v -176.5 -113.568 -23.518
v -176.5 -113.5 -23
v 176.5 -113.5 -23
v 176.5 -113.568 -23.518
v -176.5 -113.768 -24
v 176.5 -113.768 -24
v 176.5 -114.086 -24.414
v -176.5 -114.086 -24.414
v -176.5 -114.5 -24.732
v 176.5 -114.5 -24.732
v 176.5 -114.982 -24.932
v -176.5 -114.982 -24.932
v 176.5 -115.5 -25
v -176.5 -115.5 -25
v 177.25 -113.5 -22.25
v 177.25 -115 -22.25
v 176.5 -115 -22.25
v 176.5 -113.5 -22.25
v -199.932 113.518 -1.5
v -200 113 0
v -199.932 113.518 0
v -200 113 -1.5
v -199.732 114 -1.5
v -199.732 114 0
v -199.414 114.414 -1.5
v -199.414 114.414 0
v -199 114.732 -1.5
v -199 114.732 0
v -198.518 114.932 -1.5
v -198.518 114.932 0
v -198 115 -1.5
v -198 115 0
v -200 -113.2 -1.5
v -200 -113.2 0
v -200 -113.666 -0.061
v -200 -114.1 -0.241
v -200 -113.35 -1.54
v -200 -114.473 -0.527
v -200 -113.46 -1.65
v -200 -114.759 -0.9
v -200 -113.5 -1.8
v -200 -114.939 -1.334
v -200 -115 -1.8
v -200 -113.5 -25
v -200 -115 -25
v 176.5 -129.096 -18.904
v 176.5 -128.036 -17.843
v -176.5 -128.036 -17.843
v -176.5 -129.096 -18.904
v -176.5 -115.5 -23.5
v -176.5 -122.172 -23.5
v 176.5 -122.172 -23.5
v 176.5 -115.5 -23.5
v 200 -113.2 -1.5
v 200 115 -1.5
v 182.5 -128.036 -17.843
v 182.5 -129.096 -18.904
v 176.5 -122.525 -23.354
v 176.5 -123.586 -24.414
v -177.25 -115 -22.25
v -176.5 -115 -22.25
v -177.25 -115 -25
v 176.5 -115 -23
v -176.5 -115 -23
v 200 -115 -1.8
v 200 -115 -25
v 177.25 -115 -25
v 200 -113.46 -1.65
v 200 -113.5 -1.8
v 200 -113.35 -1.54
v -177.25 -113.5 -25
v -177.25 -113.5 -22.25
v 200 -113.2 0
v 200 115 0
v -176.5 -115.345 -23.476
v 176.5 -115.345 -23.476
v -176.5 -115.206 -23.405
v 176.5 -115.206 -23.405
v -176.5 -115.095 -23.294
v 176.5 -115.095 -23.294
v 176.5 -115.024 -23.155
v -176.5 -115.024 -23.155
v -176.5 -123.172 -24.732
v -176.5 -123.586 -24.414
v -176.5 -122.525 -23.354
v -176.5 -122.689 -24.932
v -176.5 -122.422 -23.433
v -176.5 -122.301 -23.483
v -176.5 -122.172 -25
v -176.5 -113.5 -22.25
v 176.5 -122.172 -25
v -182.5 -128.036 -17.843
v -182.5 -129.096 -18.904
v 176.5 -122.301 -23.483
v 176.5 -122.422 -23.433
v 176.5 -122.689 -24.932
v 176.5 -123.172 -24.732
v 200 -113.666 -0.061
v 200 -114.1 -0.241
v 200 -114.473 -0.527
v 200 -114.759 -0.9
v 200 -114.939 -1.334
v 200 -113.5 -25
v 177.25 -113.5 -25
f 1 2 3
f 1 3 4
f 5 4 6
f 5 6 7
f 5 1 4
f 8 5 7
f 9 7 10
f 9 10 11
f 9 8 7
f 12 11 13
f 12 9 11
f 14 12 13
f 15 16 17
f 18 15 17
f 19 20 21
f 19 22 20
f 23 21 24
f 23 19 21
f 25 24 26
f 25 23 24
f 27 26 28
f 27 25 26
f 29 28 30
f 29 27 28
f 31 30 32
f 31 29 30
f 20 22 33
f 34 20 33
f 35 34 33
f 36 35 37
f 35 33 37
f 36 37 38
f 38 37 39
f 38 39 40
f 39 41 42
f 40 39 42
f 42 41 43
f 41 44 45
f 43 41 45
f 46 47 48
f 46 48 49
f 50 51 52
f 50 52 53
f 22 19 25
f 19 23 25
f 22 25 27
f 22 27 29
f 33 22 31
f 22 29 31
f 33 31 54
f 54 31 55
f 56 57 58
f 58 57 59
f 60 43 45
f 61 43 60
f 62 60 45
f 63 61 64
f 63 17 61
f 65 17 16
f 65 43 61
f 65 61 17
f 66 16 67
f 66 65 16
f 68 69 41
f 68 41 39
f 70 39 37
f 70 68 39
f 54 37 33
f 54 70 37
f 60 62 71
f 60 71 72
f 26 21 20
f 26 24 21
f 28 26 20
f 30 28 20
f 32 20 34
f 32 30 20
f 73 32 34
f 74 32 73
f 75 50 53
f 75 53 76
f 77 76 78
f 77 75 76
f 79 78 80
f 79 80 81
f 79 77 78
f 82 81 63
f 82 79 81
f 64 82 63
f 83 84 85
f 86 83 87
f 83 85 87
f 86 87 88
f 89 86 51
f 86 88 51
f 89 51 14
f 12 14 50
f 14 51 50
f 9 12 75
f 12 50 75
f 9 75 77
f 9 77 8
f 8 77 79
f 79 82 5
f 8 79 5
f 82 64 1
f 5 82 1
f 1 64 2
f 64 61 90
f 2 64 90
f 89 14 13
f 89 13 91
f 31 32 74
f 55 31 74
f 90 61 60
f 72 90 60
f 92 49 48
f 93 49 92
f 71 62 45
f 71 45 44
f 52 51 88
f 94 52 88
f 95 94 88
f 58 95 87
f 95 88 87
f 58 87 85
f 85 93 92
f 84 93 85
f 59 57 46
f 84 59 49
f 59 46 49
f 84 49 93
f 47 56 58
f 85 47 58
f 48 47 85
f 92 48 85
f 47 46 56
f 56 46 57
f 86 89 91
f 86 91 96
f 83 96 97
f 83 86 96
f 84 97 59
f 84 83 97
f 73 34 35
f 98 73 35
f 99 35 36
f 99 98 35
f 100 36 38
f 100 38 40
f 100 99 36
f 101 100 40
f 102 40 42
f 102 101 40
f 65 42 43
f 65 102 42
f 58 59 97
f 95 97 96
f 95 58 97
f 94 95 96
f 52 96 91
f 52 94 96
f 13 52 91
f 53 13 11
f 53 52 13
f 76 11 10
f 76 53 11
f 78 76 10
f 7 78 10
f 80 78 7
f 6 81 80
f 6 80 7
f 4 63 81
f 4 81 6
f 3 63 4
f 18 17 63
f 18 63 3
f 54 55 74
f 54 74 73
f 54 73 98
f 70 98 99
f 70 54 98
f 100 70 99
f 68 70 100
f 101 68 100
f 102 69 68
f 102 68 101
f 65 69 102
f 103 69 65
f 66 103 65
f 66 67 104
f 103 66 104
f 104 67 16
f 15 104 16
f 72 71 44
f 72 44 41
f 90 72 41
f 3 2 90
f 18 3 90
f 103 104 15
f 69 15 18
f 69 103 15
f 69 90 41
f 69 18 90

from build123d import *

# Parameters (mm, degrees)
SKETCH_1_W                        = 400
SKETCH_1_H                        = 230
SM_BASE_FLANGE_1_DEPTH            = 1.5
SM_EDGE_FLANGE_1_STRIP_W          = 6.6
SM_EDGE_FLANGE_1_STRIP_H          = 1.5
SM_EDGE_FLANGE_1_STRIP_CUT_DEPTH  = 400
SM_EDGE_FLANGE_1_DEPTH            = 400
SM_EDGE_FLANGE_2_STRIP_W          = 7
SM_EDGE_FLANGE_2_STRIP_H          = 1.5
SM_EDGE_FLANGE_2_STRIP_CUT_DEPTH  = 353
SM_EDGE_FLANGE_2_RELIEF_W         = 7.75
SM_EDGE_FLANGE_2_RELIEF_H         = 0.75
SM_EDGE_FLANGE_2_RELIEF_CUT_DEPTH = 1.5
SM_EDGE_FLANGE_2_DEPTH            = 353
FILLET_1_R                        = 2
SM_START                          = -176.5
SM_EDGE_FLANGE_3_DEPTH            = 353
SM_EDGE_FLANGE_3_2_DEPTH          = 353
SM_BASE_FLANGE_1_2_DEPTH          = 1.5


# Read off the part's stored shape, not the designer's step: 边线-法兰3
# Sheet-metal steps are written as plain solids
with BuildPart() as part:
    # Sketch 1 → Sm Base Flange 1 (new body)
    with BuildSketch(Plane.XY):
        Rectangle(SKETCH_1_W, SKETCH_1_H)
    extrude(amount=-SM_BASE_FLANGE_1_DEPTH)

    # 边线-法兰1 strip (across the edge) → 边线-法兰1 strip cut (cut)
    with BuildSketch(Plane(origin=(200, -115, -1.5), x_dir=(0, 1, 0), z_dir=(-1, 0, 0))):
        with Locations((-1.5, -0.75)):
            Rectangle(SM_EDGE_FLANGE_1_STRIP_W, SM_EDGE_FLANGE_1_STRIP_H)
    extrude(amount=SM_EDGE_FLANGE_1_STRIP_CUT_DEPTH, mode=Mode.SUBTRACT)

    # 边线-法兰1 section (across the edge) → 边线-法兰1 (add)
    with BuildSketch(Plane(origin=(200, -115, -1.5), x_dir=(0, 1, 0), z_dir=(-1, 0, 0))):
        with BuildLine():
            Line((0, 0.3), (0, 23.5))
            Line((0, 23.5), (1.5, 23.5))
            Line((1.5, 23.5), (1.5, 0.3))
            ThreePointArc((1.5, 0.3), (1.587867966, 0.087867966), (1.8, 0))
            Line((1.8, 0), (1.8, -1.5))
            ThreePointArc((1.8, -1.5), (0.527207794, -0.972792206), (0, 0.3))
        make_face()
    extrude(amount=SM_EDGE_FLANGE_1_DEPTH)

    # 边线-法兰2 strip (across the edge) → 边线-法兰2 strip cut (cut)
    with BuildSketch(Plane(origin=(-176.5, -115, -25), x_dir=(0, 0, 1), z_dir=(1, 0, 0))):
        with Locations((-1.5, -0.75)):
            Rectangle(SM_EDGE_FLANGE_2_STRIP_W, SM_EDGE_FLANGE_2_STRIP_H)
    extrude(amount=SM_EDGE_FLANGE_2_STRIP_CUT_DEPTH, mode=Mode.SUBTRACT)

    # 边线-法兰2 relief (on the sheet) → 边线-法兰2 relief cut (cut)
    with BuildSketch(Plane(origin=(-176.5, -115, -23), x_dir=(0, 0, 1), z_dir=(0, -1, 0))):
        with Locations((-3.125, 0.375)):
            Rectangle(SM_EDGE_FLANGE_2_RELIEF_W, SM_EDGE_FLANGE_2_RELIEF_H)
        with Locations((-3.125, -353.375)):
            Rectangle(SM_EDGE_FLANGE_2_RELIEF_W, SM_EDGE_FLANGE_2_RELIEF_H)
    extrude(amount=-SM_EDGE_FLANGE_2_RELIEF_CUT_DEPTH, mode=Mode.SUBTRACT)

    # 边线-法兰2 section (across the edge) → 边线-法兰2 (add)
    with BuildSketch(Plane(origin=(-176.5, -115, -25), x_dir=(0, 0, 1), z_dir=(1, 0, 0))):
        with BuildLine():
            Line((0, 0.5), (0, 9.5))
            Line((0, 9.5), (1.5, 9.5))
            Line((1.5, 9.5), (1.5, 0.5))
            ThreePointArc((1.5, 0.5), (1.646446609, 0.146446609), (2, 0))
            Line((2, 0), (2, -1.5))
            ThreePointArc((2, -1.5), (0.585786438, -0.914213562), (0, 0.5))
        make_face()
    extrude(amount=SM_EDGE_FLANGE_2_DEPTH)

    # 圆角1
    fillet_1_edges = [part.edges().sort_by_distance(p)[0] for p in [
        (-200, 115, -0.75),
    ]]
    fillet(fillet_1_edges, radius=FILLET_1_R)

    # 边线-法兰3 outline → 边线-法兰3 (cut)
    with BuildSketch(Plane.YZ.offset(SM_START)):
        with BuildLine():
            ThreePointArc((-122.171572875, -25), (-122.93693974, -24.847759065), (-123.585786438, -24.414213562))
            Line((-123.585786438, -24.414213562), (-124.5, -23.5))
            Line((-124.5, -23.5), (-124.5, -25))
            Line((-124.5, -25), (-122.171572875, -25))
        make_face()
    extrude(amount=SM_EDGE_FLANGE_3_DEPTH, mode=Mode.SUBTRACT)

    # Sm Edge Flange 3 2 outline → Sm Edge Flange 3 2 (add)
    with BuildSketch(Plane.YZ.offset(SM_START)):
        with BuildLine():
            Line((-129.096194078, -18.903805922), (-124.5, -23.5))
            Line((-124.5, -23.5), (-122.171572875, -23.5))
            ThreePointArc((-122.171572875, -23.5), (-122.362914591, -23.461939766), (-122.525126266, -23.353553391))
            Line((-122.525126266, -23.353553391), (-128.035533906, -17.843145751))
            Line((-128.035533906, -17.843145751), (-129.096194078, -18.903805922))
        make_face()
    extrude(amount=SM_EDGE_FLANGE_3_2_DEPTH)

    # 草图40 → Sm Base Flange 1 2 (add)
    with BuildSketch(Plane(origin=(0, -74, -74), x_dir=(1, 0, 0), z_dir=(0, -0.7071067811865435, -0.7071067811865516))):
        Polygon((176.5, 77.9177849), (182.5, 77.9177849), (176.5, 70.124891681), align=None)
        Polygon((-176.5, 77.9177849), (-182.5, 77.9177849), (-176.5, 70.124891681), align=None)
    extrude(amount=-SM_BASE_FLANGE_1_2_DEPTH)


solid = part.part
